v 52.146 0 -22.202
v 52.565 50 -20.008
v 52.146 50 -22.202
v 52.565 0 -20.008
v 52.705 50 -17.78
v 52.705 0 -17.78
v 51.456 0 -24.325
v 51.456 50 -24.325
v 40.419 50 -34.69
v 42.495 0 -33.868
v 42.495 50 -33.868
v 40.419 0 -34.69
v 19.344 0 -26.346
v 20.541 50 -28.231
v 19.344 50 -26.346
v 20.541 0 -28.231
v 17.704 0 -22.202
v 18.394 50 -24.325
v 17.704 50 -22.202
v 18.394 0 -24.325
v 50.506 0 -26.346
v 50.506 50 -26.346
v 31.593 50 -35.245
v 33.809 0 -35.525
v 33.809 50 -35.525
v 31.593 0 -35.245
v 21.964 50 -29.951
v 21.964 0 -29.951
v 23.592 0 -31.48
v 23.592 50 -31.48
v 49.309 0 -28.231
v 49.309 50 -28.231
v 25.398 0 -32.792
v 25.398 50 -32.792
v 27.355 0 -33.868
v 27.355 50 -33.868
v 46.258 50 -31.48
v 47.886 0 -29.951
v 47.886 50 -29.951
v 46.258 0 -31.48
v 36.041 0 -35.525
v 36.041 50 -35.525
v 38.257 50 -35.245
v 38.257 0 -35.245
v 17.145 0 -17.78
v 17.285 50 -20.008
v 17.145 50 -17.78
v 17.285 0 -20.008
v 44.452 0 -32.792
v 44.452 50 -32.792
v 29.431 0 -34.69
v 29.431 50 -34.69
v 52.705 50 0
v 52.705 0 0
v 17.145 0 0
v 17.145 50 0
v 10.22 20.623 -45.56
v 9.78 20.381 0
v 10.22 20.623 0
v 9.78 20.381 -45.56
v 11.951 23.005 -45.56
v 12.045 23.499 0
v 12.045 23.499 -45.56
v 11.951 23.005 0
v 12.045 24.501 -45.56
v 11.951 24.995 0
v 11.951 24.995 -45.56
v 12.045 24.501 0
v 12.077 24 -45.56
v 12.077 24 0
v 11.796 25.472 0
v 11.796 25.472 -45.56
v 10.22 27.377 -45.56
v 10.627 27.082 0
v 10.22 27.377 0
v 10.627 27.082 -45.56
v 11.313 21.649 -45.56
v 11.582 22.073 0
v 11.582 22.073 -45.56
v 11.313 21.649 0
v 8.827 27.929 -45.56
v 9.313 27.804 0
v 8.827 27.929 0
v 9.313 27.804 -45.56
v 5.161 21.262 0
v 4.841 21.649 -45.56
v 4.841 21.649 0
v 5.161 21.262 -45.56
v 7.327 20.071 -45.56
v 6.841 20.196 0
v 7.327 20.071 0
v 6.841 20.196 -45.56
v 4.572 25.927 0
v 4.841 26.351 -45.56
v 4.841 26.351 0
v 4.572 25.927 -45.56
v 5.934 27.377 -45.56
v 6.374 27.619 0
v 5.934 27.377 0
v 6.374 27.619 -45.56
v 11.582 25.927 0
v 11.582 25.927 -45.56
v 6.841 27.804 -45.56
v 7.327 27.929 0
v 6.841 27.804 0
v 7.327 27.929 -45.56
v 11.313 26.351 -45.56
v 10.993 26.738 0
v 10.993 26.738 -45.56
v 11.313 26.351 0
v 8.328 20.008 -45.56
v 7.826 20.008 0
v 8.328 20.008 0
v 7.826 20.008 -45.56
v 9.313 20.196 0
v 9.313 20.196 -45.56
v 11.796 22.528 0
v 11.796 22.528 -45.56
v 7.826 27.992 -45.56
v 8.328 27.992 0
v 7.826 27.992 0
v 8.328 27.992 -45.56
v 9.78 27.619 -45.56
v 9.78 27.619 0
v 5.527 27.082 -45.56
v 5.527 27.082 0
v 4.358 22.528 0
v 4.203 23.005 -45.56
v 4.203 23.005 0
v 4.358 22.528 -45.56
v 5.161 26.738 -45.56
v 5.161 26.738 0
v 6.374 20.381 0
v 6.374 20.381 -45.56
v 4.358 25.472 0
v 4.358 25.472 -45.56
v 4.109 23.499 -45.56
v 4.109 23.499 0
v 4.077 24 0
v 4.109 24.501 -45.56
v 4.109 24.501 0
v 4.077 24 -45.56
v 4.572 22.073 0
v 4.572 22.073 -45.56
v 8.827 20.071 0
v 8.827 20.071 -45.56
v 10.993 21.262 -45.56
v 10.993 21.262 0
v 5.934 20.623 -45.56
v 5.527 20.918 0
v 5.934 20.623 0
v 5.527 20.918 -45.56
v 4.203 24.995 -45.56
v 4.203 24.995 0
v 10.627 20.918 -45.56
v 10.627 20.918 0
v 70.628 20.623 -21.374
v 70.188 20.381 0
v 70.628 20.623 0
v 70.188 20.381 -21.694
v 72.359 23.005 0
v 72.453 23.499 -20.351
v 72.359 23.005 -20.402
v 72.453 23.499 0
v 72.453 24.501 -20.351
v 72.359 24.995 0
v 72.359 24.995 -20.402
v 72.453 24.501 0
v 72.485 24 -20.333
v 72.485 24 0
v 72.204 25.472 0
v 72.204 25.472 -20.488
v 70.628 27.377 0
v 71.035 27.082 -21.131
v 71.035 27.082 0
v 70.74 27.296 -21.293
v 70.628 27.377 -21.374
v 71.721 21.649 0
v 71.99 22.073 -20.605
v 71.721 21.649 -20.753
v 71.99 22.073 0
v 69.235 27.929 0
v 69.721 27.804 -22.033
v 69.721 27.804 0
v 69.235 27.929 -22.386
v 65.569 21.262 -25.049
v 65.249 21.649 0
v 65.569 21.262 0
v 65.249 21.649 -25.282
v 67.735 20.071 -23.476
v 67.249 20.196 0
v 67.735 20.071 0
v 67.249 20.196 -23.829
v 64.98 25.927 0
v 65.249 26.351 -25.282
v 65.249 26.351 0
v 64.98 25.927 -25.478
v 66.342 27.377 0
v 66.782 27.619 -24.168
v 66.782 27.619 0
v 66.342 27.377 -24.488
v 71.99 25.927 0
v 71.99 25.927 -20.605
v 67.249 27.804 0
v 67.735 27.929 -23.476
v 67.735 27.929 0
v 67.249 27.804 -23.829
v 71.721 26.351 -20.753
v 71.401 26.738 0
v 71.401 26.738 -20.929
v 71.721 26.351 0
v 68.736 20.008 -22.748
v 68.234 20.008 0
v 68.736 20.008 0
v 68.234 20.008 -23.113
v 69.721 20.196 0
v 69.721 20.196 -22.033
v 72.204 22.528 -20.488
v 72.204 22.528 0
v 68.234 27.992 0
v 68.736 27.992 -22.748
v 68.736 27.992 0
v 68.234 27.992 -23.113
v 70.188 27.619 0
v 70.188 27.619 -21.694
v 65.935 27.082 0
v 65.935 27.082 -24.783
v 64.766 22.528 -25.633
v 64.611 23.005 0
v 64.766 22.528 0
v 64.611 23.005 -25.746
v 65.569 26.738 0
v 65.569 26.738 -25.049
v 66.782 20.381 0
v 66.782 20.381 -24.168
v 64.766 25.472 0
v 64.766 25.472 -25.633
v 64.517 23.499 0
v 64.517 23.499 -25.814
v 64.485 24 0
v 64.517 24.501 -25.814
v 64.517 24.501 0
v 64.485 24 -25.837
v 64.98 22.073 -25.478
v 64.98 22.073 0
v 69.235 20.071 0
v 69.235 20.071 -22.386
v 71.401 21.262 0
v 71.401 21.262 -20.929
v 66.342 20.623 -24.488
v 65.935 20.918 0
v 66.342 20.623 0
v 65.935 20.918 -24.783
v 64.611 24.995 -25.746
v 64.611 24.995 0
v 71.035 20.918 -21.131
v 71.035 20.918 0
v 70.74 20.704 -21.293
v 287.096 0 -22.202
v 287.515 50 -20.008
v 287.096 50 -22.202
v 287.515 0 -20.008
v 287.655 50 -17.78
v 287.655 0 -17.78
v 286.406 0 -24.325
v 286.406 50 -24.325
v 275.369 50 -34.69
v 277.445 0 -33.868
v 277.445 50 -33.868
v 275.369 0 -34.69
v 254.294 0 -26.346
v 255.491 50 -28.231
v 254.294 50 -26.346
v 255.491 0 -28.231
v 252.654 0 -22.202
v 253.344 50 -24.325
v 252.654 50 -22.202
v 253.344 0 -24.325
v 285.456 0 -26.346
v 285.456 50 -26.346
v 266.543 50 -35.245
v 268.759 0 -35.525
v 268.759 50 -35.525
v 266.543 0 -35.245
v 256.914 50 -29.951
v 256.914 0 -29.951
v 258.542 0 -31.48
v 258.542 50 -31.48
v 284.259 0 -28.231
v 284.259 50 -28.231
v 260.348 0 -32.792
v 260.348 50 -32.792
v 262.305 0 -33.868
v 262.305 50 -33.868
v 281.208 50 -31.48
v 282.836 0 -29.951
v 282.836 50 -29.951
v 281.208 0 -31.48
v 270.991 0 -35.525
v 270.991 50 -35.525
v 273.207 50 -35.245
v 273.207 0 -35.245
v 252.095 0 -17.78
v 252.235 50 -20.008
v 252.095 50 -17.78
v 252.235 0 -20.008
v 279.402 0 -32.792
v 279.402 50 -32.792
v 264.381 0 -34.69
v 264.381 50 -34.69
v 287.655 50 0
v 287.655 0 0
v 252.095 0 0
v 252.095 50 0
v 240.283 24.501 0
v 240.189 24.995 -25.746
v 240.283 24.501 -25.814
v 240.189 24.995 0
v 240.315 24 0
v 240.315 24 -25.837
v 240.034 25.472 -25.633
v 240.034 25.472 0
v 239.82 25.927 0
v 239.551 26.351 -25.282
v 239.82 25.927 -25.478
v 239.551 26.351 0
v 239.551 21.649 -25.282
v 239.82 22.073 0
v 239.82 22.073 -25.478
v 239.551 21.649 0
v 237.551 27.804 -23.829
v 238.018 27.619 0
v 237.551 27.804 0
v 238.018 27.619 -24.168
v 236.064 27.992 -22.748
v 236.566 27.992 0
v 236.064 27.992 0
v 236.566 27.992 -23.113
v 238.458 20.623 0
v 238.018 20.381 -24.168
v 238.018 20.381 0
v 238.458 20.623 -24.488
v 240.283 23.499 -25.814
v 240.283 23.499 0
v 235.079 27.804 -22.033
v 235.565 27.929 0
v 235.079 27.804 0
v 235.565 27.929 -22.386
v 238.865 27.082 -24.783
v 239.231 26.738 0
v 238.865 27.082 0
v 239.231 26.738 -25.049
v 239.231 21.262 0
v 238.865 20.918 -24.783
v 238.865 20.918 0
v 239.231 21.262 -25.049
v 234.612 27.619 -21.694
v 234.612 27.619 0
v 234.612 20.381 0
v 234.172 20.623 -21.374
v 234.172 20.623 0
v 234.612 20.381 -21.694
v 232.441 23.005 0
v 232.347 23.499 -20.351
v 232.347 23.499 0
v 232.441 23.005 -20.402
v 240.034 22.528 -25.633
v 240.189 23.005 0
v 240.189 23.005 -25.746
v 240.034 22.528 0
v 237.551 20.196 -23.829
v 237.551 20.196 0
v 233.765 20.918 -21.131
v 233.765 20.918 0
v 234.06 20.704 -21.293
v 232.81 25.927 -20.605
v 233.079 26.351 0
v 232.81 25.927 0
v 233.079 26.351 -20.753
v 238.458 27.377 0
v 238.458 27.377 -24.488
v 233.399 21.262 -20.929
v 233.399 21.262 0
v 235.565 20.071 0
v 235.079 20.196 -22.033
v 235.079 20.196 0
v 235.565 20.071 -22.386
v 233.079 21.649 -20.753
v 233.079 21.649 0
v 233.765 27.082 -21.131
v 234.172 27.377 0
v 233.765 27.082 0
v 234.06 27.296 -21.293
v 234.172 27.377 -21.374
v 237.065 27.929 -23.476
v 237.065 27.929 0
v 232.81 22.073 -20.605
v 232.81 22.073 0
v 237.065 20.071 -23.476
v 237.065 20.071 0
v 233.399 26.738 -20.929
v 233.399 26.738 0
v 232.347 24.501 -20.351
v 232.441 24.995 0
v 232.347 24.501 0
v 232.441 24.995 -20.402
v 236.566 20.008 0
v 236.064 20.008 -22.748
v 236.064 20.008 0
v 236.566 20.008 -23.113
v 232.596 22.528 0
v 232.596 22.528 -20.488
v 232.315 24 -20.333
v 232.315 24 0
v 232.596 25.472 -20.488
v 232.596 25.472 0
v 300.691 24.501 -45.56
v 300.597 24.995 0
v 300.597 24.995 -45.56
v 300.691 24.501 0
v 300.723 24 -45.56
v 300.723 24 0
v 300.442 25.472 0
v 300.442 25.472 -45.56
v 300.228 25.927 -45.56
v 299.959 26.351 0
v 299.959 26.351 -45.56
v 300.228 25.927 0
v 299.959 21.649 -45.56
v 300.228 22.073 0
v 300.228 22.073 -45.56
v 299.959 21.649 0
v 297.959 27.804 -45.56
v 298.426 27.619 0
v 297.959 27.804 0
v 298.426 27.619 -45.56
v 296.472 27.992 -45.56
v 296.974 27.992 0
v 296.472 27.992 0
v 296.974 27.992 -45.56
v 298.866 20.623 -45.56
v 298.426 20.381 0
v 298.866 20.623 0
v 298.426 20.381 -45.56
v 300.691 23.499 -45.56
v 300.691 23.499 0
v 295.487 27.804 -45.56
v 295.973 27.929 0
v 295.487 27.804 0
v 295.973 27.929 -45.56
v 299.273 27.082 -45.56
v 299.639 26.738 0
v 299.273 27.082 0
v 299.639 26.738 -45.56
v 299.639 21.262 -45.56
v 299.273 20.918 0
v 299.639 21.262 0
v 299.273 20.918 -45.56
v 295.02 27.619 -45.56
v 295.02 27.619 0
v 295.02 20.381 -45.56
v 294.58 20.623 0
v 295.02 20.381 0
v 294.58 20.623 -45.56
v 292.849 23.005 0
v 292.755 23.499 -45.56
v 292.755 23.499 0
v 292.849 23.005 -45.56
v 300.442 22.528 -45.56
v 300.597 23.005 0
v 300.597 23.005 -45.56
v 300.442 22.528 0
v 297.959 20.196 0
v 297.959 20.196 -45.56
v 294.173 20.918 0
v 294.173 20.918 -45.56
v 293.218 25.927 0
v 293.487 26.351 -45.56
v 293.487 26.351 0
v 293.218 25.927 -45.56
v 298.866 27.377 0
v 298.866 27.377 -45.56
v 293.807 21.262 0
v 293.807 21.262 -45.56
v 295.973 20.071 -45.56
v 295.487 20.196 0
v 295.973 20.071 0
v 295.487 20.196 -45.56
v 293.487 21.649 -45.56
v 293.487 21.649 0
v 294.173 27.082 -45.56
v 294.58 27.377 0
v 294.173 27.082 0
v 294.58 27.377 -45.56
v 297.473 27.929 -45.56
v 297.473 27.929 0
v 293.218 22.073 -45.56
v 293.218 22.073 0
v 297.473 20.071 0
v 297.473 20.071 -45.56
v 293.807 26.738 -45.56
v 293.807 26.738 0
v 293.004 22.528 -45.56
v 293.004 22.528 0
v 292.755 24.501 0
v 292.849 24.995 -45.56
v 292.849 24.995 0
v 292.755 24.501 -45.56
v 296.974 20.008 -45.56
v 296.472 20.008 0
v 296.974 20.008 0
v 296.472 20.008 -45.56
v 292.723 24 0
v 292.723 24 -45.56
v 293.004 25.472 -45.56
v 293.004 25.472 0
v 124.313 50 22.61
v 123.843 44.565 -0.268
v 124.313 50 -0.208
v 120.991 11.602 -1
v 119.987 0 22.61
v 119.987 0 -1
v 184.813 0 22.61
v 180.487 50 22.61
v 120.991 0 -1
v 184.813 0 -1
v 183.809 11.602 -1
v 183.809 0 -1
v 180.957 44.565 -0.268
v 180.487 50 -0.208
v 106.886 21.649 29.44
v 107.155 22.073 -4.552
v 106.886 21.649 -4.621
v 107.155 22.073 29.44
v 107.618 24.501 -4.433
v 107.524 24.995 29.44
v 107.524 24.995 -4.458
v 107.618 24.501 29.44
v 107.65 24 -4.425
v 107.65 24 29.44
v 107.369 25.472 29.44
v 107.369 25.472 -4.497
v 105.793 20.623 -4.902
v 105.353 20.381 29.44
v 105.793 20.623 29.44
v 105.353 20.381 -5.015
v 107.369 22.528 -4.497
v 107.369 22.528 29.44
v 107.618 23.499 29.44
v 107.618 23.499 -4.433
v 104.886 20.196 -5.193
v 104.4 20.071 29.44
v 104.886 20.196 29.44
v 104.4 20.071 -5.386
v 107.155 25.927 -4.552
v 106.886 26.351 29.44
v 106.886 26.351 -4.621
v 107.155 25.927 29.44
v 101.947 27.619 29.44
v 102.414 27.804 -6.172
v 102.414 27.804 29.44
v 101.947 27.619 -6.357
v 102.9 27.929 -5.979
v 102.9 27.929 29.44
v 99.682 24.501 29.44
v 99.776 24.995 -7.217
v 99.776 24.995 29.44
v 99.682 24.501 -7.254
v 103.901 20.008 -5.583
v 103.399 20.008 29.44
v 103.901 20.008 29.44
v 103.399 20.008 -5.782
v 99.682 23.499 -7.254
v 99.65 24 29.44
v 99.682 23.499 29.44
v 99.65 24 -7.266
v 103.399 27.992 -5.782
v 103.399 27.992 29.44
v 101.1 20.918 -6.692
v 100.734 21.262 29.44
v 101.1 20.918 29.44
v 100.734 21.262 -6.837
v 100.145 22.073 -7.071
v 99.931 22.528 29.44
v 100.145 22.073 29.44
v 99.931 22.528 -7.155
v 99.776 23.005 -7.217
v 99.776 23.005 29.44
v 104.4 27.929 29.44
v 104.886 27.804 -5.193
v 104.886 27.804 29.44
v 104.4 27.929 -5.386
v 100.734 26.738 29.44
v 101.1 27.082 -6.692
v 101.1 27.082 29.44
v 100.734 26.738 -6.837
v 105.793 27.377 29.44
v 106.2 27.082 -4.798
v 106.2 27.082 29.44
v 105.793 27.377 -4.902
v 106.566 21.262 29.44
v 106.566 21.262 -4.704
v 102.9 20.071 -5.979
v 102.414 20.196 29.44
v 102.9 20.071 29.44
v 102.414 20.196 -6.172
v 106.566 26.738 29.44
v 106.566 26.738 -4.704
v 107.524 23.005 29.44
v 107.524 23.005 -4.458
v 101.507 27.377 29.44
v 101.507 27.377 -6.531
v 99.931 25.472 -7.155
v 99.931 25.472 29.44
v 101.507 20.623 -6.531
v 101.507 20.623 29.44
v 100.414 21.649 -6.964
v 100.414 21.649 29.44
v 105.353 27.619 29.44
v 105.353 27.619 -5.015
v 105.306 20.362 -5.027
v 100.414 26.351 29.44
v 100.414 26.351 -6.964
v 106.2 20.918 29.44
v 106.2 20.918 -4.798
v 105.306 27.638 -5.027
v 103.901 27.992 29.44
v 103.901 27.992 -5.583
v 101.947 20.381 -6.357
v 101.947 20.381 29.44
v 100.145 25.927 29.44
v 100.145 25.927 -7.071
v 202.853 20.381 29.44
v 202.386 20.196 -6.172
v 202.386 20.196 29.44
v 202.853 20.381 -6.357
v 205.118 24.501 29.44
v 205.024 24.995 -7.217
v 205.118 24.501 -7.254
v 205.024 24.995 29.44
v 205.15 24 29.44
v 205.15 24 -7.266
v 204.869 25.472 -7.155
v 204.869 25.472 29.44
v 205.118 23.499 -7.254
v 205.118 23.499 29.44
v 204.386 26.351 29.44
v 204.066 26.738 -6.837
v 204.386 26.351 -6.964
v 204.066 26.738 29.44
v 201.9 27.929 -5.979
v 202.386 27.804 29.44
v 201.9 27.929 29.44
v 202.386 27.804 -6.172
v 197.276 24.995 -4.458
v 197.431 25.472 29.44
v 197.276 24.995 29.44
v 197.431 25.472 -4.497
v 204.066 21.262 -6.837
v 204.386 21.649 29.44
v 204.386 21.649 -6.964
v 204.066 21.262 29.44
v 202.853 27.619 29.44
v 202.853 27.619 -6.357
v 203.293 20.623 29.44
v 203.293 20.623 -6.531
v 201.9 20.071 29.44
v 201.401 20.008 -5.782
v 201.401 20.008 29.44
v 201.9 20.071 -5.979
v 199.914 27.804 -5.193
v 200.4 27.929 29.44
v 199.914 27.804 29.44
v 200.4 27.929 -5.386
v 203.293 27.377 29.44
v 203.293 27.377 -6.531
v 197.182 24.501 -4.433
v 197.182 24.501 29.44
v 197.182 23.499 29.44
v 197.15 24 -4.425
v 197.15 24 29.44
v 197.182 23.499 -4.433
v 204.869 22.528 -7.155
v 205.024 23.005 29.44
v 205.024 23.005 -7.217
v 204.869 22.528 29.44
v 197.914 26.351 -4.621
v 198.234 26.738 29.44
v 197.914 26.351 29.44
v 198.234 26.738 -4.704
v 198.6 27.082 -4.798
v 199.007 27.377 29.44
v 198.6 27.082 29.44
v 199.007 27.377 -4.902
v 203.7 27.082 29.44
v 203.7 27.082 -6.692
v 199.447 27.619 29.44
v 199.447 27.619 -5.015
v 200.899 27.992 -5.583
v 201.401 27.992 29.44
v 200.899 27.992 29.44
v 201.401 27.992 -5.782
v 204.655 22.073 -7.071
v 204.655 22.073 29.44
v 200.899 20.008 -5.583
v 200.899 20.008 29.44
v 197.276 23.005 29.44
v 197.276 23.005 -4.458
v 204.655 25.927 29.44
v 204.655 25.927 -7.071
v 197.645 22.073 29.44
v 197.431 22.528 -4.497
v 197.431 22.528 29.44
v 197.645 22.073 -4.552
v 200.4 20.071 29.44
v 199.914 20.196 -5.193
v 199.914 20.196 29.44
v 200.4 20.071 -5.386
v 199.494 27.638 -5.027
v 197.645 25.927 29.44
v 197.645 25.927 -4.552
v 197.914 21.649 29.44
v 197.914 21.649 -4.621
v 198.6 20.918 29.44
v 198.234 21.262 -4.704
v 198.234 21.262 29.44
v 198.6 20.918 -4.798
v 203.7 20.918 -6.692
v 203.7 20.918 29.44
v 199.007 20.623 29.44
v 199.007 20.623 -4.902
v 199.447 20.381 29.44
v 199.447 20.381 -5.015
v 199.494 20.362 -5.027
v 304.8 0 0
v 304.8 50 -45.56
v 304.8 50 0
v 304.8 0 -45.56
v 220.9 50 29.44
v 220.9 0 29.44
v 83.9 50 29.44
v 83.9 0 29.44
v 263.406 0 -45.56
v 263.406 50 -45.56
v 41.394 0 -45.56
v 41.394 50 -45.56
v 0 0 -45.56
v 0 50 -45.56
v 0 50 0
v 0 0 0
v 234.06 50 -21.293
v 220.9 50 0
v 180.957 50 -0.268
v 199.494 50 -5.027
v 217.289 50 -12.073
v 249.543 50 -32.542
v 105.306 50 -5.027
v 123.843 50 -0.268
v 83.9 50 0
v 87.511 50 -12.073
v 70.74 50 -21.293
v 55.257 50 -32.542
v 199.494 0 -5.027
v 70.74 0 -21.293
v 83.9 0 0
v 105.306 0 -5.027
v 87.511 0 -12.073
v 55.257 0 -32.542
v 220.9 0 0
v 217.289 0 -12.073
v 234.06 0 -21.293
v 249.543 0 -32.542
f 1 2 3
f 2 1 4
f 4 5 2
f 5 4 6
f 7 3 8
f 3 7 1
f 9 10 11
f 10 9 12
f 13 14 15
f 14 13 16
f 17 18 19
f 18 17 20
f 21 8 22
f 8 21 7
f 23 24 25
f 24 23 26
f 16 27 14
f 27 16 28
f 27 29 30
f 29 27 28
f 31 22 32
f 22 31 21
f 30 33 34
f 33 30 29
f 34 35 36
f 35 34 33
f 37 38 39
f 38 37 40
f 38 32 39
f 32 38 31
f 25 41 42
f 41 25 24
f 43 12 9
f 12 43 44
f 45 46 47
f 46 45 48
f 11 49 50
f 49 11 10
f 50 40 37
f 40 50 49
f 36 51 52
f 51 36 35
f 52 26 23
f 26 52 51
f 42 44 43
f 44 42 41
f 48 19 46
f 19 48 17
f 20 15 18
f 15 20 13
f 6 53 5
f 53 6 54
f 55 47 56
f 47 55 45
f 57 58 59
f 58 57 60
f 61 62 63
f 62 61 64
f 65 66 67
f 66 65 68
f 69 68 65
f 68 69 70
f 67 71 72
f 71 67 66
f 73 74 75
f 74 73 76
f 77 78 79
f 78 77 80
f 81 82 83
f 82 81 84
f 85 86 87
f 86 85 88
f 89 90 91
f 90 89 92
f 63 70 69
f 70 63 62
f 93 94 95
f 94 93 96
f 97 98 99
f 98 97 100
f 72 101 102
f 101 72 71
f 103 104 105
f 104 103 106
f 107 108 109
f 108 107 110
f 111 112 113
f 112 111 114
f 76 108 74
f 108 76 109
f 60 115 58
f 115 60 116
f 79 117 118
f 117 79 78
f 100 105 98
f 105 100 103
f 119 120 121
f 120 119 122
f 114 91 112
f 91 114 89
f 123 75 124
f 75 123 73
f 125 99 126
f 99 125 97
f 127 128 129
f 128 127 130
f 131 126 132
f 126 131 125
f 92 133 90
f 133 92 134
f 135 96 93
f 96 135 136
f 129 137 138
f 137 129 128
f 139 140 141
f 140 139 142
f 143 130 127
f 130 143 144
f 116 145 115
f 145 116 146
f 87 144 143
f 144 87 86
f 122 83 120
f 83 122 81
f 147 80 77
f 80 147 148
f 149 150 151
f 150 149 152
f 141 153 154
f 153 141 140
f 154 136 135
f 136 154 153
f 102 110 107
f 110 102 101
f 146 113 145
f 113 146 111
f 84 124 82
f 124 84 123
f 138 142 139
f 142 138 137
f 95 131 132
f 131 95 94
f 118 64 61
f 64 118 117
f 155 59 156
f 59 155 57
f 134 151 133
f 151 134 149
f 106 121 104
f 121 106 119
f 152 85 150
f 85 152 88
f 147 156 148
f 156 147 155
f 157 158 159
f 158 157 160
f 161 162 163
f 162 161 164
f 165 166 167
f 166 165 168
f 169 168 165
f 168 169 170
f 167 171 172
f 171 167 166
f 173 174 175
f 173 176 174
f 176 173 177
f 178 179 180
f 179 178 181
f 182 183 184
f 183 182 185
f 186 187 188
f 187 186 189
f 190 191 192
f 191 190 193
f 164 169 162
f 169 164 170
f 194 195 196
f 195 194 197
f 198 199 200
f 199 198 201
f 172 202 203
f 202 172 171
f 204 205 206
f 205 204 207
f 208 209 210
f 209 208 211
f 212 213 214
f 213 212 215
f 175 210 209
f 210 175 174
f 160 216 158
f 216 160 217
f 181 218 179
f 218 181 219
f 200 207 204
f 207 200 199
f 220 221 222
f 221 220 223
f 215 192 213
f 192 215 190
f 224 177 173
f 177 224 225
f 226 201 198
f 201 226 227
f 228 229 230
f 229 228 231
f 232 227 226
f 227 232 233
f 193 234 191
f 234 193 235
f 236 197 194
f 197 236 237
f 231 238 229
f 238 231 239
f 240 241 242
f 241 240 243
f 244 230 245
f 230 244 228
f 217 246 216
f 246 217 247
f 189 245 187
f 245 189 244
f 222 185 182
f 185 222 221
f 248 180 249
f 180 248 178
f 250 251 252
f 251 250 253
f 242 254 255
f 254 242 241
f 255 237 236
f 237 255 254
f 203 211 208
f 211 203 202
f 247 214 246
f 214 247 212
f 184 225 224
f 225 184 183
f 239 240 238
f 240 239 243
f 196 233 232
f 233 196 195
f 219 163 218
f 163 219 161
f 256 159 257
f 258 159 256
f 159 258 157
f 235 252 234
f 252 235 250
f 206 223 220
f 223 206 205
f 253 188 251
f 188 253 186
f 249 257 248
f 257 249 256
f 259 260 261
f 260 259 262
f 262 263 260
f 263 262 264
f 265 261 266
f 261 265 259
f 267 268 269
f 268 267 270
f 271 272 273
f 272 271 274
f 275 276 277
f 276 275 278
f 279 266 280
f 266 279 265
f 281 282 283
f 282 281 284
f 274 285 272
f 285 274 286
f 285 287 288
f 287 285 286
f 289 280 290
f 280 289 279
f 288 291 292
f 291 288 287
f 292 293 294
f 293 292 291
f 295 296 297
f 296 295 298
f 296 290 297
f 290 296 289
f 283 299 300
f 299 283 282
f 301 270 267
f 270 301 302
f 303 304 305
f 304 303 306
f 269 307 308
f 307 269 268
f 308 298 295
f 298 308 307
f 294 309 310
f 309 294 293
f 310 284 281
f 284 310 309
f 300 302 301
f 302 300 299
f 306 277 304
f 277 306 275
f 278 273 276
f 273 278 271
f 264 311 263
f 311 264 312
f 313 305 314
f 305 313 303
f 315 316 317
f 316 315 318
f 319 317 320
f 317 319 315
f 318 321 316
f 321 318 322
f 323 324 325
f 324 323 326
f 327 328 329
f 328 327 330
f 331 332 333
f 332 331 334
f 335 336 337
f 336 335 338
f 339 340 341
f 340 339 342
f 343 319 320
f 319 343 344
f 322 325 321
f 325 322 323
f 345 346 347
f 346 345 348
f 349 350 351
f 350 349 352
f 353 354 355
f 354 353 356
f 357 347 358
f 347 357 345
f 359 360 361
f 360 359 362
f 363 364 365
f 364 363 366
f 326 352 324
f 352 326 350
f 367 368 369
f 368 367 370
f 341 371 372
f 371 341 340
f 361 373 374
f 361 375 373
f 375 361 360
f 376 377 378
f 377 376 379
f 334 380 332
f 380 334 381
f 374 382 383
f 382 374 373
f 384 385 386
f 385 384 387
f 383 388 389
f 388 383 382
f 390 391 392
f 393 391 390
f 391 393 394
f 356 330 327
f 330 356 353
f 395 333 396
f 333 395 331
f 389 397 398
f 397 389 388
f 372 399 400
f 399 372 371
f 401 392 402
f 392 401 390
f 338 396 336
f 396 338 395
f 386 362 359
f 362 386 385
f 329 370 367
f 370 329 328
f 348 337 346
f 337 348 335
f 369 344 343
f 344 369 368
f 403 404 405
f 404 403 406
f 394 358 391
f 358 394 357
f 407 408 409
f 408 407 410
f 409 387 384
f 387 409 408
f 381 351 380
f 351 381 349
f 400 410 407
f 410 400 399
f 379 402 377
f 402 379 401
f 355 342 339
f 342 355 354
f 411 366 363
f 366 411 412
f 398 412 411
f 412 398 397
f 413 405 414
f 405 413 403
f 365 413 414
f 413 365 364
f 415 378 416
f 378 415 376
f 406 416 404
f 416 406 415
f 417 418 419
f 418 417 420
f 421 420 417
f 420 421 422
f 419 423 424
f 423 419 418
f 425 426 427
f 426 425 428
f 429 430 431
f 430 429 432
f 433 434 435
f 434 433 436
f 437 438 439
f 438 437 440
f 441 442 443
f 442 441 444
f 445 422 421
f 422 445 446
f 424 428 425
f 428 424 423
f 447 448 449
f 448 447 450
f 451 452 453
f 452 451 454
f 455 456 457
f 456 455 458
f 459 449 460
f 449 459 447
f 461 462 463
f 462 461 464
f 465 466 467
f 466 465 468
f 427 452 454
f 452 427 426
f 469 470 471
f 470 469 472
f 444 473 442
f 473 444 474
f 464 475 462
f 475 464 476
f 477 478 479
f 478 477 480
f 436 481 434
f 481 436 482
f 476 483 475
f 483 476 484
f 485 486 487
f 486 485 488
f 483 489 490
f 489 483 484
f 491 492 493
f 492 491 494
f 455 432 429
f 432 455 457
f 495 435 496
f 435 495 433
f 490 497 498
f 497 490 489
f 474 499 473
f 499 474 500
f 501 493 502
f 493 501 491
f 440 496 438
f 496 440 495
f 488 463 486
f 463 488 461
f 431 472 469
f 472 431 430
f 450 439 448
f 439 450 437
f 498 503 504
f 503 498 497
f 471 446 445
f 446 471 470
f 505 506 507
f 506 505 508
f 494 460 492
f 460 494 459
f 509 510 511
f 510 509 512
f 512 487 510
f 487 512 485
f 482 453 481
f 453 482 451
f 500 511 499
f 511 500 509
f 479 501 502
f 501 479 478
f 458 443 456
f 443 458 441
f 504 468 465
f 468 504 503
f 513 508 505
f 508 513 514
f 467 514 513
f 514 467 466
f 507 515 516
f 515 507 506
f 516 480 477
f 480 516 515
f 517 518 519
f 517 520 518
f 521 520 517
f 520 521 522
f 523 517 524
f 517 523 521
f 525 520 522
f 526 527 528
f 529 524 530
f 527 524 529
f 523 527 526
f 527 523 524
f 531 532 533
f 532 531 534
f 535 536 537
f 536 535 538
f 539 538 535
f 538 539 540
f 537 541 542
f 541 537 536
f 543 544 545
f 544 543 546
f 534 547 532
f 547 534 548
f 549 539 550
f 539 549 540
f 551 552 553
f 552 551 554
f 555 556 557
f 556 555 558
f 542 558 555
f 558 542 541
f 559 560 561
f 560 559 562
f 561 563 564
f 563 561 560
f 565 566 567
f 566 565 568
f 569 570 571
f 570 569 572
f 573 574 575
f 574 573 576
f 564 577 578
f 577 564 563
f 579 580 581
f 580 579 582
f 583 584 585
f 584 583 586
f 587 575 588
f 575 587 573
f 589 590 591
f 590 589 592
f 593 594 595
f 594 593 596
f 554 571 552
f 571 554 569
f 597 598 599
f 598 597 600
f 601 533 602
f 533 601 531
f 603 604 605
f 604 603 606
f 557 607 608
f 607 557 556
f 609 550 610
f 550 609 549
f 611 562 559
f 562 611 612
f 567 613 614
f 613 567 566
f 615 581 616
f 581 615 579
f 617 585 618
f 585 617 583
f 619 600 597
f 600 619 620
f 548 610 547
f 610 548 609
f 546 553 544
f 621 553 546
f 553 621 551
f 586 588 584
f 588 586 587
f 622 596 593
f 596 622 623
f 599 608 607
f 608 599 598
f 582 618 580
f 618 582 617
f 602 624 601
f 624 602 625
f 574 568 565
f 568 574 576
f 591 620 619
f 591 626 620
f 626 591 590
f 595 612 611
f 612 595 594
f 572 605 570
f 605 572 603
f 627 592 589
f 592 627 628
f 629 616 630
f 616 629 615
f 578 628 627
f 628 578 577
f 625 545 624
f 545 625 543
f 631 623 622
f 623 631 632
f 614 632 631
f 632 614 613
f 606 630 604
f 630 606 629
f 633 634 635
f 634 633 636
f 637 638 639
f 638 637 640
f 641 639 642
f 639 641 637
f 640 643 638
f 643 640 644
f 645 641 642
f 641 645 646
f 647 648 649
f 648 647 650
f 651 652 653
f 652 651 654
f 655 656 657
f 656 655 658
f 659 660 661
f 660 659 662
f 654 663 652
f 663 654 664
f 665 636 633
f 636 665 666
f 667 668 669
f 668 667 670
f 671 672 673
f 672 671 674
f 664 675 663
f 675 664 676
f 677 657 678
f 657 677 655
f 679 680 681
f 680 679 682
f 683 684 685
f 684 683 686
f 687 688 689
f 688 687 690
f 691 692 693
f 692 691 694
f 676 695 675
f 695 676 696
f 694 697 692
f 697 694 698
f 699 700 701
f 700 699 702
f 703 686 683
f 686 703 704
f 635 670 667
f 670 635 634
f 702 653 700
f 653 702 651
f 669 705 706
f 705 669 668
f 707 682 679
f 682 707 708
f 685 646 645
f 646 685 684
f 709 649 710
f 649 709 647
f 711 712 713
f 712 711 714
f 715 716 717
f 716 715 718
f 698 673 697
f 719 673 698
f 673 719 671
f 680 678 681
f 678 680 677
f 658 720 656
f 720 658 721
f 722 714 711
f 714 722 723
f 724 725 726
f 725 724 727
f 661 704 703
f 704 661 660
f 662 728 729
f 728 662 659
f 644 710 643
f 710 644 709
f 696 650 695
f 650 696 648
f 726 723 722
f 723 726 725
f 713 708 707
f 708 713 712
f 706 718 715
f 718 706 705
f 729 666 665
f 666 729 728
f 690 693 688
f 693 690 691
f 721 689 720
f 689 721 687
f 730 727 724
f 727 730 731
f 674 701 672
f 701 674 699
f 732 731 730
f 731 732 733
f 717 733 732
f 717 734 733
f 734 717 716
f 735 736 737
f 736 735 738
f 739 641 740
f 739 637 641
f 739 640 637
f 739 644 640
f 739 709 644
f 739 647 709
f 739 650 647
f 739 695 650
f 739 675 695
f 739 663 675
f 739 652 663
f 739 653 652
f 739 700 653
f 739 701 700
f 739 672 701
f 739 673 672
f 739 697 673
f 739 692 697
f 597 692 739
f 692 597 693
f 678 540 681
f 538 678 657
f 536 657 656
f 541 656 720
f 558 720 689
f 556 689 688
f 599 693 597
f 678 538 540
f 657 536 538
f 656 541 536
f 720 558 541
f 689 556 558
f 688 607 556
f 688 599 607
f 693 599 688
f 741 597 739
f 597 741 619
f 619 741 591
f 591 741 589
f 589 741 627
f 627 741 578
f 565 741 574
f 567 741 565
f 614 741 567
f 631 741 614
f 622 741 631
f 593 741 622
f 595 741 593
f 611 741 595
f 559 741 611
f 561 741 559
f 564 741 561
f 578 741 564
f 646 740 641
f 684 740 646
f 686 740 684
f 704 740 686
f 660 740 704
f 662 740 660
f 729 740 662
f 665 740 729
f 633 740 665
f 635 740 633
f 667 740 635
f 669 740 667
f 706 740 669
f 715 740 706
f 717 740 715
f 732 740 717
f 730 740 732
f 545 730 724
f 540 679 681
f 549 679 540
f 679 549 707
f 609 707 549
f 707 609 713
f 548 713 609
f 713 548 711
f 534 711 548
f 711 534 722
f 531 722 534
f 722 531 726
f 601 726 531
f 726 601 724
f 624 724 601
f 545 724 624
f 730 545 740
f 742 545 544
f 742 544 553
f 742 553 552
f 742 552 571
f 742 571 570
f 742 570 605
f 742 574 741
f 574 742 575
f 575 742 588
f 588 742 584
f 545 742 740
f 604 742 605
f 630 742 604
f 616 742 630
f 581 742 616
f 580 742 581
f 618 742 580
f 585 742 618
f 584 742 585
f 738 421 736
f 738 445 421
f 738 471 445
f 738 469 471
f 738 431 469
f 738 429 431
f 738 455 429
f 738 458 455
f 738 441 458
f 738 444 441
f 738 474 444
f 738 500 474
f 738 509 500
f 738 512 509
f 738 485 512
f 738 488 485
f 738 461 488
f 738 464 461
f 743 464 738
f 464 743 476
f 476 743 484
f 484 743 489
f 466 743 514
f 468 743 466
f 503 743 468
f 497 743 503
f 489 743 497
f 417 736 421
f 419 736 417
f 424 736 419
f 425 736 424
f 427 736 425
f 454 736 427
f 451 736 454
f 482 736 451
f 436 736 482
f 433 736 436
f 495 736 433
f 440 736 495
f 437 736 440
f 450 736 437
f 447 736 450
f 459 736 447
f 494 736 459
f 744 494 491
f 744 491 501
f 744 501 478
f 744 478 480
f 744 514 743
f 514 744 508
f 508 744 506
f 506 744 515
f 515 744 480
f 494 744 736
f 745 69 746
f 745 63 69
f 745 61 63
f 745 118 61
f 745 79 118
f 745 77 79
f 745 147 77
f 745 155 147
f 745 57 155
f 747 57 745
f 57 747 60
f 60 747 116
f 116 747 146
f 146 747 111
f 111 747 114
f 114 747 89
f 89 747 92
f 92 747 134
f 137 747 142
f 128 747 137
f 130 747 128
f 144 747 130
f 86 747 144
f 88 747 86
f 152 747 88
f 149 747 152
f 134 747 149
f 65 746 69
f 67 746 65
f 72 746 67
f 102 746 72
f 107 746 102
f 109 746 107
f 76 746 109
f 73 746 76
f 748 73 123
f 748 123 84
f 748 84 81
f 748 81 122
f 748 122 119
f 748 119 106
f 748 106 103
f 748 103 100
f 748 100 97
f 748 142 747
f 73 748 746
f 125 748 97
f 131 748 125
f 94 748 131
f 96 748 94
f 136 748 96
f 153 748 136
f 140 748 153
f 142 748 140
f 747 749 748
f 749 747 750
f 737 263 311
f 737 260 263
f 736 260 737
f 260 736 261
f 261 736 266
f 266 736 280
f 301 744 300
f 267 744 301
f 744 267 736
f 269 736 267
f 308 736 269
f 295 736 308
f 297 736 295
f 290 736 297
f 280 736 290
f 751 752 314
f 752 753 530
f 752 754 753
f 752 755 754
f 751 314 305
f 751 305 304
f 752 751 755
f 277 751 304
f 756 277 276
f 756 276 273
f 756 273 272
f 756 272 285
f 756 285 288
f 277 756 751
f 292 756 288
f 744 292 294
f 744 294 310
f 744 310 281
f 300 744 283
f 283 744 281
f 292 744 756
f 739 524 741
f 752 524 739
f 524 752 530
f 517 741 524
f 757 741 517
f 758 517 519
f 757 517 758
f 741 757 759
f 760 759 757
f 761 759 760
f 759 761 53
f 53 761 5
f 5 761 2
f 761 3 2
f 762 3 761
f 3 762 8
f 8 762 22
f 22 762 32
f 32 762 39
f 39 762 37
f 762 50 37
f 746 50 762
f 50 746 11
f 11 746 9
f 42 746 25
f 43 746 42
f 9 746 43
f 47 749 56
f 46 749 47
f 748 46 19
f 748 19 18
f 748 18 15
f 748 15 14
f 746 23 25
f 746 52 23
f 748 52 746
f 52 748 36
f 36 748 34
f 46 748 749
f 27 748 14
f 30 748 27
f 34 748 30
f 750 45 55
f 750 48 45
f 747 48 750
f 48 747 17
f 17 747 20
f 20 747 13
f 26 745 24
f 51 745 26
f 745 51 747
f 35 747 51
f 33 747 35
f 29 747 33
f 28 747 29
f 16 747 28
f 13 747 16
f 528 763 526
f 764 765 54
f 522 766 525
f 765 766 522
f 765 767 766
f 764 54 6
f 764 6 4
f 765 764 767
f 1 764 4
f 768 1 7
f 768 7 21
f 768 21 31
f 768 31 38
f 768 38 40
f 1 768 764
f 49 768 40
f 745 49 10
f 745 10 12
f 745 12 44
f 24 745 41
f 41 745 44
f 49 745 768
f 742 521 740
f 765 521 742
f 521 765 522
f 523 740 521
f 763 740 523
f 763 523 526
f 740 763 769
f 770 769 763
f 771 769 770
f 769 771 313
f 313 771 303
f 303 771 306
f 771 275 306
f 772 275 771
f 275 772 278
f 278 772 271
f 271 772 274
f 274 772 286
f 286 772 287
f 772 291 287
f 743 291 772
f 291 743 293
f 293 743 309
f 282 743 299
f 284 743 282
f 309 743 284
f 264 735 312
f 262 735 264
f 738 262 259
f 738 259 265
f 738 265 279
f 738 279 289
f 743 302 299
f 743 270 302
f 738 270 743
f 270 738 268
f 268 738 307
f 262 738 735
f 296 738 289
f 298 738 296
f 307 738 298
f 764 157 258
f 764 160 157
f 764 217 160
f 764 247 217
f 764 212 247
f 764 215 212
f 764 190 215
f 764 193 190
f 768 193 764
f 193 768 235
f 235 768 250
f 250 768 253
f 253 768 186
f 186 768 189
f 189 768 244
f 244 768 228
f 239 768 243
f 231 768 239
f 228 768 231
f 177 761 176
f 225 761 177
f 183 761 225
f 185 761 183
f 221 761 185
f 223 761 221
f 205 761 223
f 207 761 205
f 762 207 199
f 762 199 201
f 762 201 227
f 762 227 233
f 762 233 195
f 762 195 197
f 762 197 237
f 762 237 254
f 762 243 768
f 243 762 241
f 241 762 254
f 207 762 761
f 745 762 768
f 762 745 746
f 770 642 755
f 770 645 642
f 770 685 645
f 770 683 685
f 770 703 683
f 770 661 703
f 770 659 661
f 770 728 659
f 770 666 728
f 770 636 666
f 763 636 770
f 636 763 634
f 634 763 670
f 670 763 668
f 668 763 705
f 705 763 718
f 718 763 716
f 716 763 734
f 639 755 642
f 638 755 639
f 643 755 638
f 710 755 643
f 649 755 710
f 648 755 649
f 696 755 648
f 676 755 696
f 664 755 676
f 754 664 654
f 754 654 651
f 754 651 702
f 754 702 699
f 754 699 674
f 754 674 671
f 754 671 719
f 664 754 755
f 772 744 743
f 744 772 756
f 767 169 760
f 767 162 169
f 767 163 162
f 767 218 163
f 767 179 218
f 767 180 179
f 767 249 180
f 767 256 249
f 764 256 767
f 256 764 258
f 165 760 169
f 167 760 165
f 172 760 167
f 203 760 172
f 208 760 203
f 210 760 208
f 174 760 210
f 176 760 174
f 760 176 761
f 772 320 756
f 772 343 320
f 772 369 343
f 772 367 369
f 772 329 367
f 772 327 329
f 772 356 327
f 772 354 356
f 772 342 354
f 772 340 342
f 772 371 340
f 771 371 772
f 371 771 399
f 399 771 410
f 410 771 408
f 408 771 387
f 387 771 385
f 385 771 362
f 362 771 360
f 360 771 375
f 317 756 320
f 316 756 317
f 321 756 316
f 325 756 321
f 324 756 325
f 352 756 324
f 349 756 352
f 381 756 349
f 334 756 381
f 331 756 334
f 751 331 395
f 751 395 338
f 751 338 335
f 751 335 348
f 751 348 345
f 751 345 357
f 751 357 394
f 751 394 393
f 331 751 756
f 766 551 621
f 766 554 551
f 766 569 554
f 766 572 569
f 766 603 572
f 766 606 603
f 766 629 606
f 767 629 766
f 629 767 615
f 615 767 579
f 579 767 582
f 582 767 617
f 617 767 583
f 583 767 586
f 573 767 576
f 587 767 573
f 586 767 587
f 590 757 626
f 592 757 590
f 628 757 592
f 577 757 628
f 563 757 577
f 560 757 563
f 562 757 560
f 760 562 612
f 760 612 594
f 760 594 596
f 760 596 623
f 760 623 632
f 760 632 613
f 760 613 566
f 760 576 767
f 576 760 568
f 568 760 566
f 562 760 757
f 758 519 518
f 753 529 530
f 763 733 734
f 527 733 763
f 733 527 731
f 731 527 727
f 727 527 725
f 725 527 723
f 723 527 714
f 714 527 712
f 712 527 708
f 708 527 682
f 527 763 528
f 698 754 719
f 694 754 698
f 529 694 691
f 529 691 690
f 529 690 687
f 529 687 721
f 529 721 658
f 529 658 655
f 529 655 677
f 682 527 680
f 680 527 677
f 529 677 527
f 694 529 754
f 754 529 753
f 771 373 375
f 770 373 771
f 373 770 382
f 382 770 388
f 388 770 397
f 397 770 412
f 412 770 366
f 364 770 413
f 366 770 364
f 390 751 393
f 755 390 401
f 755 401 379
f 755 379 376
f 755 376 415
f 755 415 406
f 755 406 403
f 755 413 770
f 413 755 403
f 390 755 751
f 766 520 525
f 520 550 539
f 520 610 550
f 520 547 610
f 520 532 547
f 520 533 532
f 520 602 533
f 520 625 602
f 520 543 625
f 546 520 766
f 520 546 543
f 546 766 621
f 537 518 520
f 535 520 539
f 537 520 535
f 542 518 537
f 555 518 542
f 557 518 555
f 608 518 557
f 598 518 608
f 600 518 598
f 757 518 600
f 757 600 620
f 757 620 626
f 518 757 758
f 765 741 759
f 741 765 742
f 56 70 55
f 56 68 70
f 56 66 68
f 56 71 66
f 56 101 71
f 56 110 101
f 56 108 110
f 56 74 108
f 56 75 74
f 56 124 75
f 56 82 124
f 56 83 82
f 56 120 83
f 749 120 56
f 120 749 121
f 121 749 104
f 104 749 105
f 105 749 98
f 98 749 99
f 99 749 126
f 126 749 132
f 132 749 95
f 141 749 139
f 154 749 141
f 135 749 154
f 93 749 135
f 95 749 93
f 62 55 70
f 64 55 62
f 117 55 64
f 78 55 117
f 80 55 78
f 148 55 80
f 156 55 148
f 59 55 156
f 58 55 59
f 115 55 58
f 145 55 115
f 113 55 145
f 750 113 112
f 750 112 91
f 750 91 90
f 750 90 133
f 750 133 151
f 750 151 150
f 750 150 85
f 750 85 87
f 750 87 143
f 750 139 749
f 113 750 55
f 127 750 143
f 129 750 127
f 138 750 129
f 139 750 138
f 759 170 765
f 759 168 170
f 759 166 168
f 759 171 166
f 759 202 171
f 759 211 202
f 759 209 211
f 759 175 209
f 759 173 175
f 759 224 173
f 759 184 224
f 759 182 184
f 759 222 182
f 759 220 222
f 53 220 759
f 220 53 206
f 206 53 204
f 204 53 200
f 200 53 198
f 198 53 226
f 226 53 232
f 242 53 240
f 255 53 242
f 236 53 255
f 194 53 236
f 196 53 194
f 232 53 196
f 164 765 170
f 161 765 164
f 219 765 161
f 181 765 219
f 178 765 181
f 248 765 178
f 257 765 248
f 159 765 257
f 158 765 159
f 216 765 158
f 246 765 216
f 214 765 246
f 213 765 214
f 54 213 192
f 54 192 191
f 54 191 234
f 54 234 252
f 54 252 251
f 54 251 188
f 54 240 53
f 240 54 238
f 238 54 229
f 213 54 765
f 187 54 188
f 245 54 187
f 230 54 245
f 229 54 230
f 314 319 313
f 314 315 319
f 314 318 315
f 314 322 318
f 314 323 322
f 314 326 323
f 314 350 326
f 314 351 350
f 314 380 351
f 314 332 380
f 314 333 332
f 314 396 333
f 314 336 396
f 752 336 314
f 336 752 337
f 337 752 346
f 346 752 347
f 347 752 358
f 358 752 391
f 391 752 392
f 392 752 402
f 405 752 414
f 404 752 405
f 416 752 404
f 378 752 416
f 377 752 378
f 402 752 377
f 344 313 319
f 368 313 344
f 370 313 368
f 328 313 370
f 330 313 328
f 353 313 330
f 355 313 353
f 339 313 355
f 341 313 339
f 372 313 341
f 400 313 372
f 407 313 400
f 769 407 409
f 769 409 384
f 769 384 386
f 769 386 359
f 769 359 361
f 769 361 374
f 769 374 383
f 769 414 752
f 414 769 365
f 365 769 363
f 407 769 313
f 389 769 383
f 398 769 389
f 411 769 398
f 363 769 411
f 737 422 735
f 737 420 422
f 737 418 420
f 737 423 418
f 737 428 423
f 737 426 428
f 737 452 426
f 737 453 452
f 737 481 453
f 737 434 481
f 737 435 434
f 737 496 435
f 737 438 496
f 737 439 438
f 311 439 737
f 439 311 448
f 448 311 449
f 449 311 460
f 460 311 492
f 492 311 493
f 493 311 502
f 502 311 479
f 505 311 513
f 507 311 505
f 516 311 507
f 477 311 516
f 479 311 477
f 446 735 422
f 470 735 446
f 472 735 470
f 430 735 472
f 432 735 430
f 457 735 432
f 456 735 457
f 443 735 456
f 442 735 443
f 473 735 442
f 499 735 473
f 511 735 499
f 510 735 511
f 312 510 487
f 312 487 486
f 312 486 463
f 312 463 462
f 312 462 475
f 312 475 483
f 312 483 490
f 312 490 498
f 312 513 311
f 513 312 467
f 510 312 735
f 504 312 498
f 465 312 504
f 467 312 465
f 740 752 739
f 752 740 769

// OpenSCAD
/*
    Speederbike outrigger front brace
*/

TOLERANCE = 2;
MIN_WALL_THICKNESS = 10;

LENGTH = 304.8;                 // 12"
WIDTH = 50;
HEIGHT = 75; //25.4;

PIPE_OD = 33.56;                // 1" PVC measured OD, not even close to 1"
PIPE_INSIDE_SPACING = 234.95;   // 9.25"
TOP_TUBE_DIAMETER = 22.61;
TOP_TUBE_SLOT = 56; //54.19;
TOP_TUBE_GAP = 15;
BOLT_DIAMETER = 8;              // slightly larger than 1/4"

$fn=50;

difference(){
    translate([0,0,-(PIPE_OD+TOLERANCE)-MIN_WALL_THICKNESS]){
        cube([LENGTH,WIDTH,HEIGHT]);
    }
    
    // pipe holders
    translate([(LENGTH/2)-(PIPE_INSIDE_SPACING/2),-1,-(PIPE_OD+TOLERANCE)/2]){
        rotate([-90,0,0]){
            cylinder(r=(PIPE_OD+TOLERANCE)/2,h=WIDTH+2);            
        }
        translate([-(PIPE_OD+TOLERANCE)/2,0,0]){
            cube([PIPE_OD+TOLERANCE,WIDTH+2,HEIGHT]);
        }
    
        // bolt holes
        translate([-PIPE_OD*0.80,WIDTH/2,-PIPE_OD]){
            cylinder(r=BOLT_DIAMETER/2,h=HEIGHT+2);
        }
        translate([PIPE_OD,WIDTH/2,-PIPE_OD]){
            cylinder(r=BOLT_DIAMETER/2,h=HEIGHT+2);
        }    
    }
    translate([(LENGTH/2)+(PIPE_INSIDE_SPACING/2),-1,-(PIPE_OD+TOLERANCE)/2]){
        rotate([-90,0,0]){
            cylinder(r=(PIPE_OD+TOLERANCE)/2,h=WIDTH+2);
        }
        translate([-(PIPE_OD+TOLERANCE)/2,0,0]){
            cube([PIPE_OD+TOLERANCE,WIDTH+2,HEIGHT]);
        }
        
        // bolt holes
        translate([-PIPE_OD,WIDTH/2,-PIPE_OD]){
            cylinder(r=BOLT_DIAMETER/2,h=HEIGHT+2);
        }
        translate([PIPE_OD*0.80,WIDTH/2,-PIPE_OD]){
            cylinder(r=BOLT_DIAMETER/2,h=HEIGHT+2);
        }
    }
    
    // top-tube slot
    tt_min = TOP_TUBE_SLOT;    // TOP_TUBE_SLOT
    tt_max = 65;    // fresh measurement
    
    translate([(LENGTH/2)-(tt_max/2),-1,-1]){
        //cube([TOP_TUBE_SLOT,WIDTH+2,TOP_TUBE_DIAMETER+1]);
        
        linear_extrude(TOP_TUBE_DIAMETER+1){
            polygon([[0,0],[(tt_max-tt_min)/2,WIDTH+2],[tt_max-((tt_max-tt_min))/2,WIDTH+2],[tt_max,0]]);
        }
        
        // bolt holes
        translate([-tt_max/4,WIDTH/2,-TOP_TUBE_DIAMETER]){
            cylinder(r=BOLT_DIAMETER/2,h=HEIGHT);
        }
        translate([tt_max+(tt_max/4),WIDTH/2,-TOP_TUBE_DIAMETER]){
            cylinder(r=BOLT_DIAMETER/2,h=HEIGHT);
        }
    }
    
    // cut-out excess underneath
    translate([LENGTH/2,-1,-((PIPE_OD+TOLERANCE)-MIN_WALL_THICKNESS)-LENGTH/2.45]){
        rotate([-90,0,0]){
            cylinder(r=LENGTH/2,h=WIDTH+2);
        }
    }
    
    // cut-out excess above pipes
    translate([-1,-1,0]){
        cube([PIPE_OD*2.5+1,WIDTH+2,HEIGHT]);
    }
    translate([LENGTH-(PIPE_OD*2.5),-1,0]){
        cube([PIPE_OD*2.5+1,WIDTH+2,HEIGHT]);
    }
}
